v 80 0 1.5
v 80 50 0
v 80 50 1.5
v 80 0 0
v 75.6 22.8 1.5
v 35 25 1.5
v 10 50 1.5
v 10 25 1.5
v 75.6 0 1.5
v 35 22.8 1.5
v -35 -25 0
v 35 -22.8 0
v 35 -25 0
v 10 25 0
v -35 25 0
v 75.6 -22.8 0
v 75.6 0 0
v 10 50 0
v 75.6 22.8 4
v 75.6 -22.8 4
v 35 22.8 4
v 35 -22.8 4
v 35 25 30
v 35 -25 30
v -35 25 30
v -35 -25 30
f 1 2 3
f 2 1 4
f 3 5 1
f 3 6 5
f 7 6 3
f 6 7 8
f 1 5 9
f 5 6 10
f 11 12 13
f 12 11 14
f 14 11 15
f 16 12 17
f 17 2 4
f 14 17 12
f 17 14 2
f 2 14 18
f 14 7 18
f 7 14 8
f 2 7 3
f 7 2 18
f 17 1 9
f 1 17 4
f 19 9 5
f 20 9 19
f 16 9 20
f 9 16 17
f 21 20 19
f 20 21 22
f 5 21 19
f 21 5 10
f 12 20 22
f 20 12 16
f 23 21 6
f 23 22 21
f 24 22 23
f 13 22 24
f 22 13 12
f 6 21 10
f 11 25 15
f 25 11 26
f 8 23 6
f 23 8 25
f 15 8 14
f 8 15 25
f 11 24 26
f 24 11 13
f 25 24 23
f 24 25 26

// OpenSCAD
// Two-part enclosure for small electronics board
// Print orientation: box upright, lid upside down (lip on top)

// ---- Parameters ----
box_x      = 70;    // box outer length (X)
box_y      = 50;    // box outer width (Y)
box_z      = 30;    // box height (Z)
box_w      = 2;     // box wall thickness
box_floor  = 2;     // box floor thickness
gap        = 10;    // gap between box and lid
lip_t      = 1.5;   // lid lip thickness (wall)
lip_h      = 4;     // lid lip height
eps        = 0.5;   // cutter overshoot

$fn = 64;

// ---- Derived ----
box_id_x = box_x - 2*box_w;   // inner length
box_id_y = box_y - 2*box_w;   // inner width
lip_w    = box_id_x - 0.4;    // lip outer length (0.2 clearance each side)
lip_d    = box_id_y - 0.4;    // lip outer width (0.2 clearance each side)

// ---- Model ----
union() {
    // Box
    translate([-box_x/2, -box_y/2, 0])
        cube([box_x, box_y, box_floor]);
    translate([-box_x/2, -box_y/2, box_floor])
        cube([box_x, box_y, box_z - box_floor]);

    // Lid (plate + lip), centred on origin, placed on +X side
    translate([gap, 0, 0])
        union() {
            // Plate
            cube([box_x, box_y, lip_t]);
            // Lip
            translate([0, -lip_d/2, 0])
                cube([lip_w, lip_d, lip_h]);
        }
}
